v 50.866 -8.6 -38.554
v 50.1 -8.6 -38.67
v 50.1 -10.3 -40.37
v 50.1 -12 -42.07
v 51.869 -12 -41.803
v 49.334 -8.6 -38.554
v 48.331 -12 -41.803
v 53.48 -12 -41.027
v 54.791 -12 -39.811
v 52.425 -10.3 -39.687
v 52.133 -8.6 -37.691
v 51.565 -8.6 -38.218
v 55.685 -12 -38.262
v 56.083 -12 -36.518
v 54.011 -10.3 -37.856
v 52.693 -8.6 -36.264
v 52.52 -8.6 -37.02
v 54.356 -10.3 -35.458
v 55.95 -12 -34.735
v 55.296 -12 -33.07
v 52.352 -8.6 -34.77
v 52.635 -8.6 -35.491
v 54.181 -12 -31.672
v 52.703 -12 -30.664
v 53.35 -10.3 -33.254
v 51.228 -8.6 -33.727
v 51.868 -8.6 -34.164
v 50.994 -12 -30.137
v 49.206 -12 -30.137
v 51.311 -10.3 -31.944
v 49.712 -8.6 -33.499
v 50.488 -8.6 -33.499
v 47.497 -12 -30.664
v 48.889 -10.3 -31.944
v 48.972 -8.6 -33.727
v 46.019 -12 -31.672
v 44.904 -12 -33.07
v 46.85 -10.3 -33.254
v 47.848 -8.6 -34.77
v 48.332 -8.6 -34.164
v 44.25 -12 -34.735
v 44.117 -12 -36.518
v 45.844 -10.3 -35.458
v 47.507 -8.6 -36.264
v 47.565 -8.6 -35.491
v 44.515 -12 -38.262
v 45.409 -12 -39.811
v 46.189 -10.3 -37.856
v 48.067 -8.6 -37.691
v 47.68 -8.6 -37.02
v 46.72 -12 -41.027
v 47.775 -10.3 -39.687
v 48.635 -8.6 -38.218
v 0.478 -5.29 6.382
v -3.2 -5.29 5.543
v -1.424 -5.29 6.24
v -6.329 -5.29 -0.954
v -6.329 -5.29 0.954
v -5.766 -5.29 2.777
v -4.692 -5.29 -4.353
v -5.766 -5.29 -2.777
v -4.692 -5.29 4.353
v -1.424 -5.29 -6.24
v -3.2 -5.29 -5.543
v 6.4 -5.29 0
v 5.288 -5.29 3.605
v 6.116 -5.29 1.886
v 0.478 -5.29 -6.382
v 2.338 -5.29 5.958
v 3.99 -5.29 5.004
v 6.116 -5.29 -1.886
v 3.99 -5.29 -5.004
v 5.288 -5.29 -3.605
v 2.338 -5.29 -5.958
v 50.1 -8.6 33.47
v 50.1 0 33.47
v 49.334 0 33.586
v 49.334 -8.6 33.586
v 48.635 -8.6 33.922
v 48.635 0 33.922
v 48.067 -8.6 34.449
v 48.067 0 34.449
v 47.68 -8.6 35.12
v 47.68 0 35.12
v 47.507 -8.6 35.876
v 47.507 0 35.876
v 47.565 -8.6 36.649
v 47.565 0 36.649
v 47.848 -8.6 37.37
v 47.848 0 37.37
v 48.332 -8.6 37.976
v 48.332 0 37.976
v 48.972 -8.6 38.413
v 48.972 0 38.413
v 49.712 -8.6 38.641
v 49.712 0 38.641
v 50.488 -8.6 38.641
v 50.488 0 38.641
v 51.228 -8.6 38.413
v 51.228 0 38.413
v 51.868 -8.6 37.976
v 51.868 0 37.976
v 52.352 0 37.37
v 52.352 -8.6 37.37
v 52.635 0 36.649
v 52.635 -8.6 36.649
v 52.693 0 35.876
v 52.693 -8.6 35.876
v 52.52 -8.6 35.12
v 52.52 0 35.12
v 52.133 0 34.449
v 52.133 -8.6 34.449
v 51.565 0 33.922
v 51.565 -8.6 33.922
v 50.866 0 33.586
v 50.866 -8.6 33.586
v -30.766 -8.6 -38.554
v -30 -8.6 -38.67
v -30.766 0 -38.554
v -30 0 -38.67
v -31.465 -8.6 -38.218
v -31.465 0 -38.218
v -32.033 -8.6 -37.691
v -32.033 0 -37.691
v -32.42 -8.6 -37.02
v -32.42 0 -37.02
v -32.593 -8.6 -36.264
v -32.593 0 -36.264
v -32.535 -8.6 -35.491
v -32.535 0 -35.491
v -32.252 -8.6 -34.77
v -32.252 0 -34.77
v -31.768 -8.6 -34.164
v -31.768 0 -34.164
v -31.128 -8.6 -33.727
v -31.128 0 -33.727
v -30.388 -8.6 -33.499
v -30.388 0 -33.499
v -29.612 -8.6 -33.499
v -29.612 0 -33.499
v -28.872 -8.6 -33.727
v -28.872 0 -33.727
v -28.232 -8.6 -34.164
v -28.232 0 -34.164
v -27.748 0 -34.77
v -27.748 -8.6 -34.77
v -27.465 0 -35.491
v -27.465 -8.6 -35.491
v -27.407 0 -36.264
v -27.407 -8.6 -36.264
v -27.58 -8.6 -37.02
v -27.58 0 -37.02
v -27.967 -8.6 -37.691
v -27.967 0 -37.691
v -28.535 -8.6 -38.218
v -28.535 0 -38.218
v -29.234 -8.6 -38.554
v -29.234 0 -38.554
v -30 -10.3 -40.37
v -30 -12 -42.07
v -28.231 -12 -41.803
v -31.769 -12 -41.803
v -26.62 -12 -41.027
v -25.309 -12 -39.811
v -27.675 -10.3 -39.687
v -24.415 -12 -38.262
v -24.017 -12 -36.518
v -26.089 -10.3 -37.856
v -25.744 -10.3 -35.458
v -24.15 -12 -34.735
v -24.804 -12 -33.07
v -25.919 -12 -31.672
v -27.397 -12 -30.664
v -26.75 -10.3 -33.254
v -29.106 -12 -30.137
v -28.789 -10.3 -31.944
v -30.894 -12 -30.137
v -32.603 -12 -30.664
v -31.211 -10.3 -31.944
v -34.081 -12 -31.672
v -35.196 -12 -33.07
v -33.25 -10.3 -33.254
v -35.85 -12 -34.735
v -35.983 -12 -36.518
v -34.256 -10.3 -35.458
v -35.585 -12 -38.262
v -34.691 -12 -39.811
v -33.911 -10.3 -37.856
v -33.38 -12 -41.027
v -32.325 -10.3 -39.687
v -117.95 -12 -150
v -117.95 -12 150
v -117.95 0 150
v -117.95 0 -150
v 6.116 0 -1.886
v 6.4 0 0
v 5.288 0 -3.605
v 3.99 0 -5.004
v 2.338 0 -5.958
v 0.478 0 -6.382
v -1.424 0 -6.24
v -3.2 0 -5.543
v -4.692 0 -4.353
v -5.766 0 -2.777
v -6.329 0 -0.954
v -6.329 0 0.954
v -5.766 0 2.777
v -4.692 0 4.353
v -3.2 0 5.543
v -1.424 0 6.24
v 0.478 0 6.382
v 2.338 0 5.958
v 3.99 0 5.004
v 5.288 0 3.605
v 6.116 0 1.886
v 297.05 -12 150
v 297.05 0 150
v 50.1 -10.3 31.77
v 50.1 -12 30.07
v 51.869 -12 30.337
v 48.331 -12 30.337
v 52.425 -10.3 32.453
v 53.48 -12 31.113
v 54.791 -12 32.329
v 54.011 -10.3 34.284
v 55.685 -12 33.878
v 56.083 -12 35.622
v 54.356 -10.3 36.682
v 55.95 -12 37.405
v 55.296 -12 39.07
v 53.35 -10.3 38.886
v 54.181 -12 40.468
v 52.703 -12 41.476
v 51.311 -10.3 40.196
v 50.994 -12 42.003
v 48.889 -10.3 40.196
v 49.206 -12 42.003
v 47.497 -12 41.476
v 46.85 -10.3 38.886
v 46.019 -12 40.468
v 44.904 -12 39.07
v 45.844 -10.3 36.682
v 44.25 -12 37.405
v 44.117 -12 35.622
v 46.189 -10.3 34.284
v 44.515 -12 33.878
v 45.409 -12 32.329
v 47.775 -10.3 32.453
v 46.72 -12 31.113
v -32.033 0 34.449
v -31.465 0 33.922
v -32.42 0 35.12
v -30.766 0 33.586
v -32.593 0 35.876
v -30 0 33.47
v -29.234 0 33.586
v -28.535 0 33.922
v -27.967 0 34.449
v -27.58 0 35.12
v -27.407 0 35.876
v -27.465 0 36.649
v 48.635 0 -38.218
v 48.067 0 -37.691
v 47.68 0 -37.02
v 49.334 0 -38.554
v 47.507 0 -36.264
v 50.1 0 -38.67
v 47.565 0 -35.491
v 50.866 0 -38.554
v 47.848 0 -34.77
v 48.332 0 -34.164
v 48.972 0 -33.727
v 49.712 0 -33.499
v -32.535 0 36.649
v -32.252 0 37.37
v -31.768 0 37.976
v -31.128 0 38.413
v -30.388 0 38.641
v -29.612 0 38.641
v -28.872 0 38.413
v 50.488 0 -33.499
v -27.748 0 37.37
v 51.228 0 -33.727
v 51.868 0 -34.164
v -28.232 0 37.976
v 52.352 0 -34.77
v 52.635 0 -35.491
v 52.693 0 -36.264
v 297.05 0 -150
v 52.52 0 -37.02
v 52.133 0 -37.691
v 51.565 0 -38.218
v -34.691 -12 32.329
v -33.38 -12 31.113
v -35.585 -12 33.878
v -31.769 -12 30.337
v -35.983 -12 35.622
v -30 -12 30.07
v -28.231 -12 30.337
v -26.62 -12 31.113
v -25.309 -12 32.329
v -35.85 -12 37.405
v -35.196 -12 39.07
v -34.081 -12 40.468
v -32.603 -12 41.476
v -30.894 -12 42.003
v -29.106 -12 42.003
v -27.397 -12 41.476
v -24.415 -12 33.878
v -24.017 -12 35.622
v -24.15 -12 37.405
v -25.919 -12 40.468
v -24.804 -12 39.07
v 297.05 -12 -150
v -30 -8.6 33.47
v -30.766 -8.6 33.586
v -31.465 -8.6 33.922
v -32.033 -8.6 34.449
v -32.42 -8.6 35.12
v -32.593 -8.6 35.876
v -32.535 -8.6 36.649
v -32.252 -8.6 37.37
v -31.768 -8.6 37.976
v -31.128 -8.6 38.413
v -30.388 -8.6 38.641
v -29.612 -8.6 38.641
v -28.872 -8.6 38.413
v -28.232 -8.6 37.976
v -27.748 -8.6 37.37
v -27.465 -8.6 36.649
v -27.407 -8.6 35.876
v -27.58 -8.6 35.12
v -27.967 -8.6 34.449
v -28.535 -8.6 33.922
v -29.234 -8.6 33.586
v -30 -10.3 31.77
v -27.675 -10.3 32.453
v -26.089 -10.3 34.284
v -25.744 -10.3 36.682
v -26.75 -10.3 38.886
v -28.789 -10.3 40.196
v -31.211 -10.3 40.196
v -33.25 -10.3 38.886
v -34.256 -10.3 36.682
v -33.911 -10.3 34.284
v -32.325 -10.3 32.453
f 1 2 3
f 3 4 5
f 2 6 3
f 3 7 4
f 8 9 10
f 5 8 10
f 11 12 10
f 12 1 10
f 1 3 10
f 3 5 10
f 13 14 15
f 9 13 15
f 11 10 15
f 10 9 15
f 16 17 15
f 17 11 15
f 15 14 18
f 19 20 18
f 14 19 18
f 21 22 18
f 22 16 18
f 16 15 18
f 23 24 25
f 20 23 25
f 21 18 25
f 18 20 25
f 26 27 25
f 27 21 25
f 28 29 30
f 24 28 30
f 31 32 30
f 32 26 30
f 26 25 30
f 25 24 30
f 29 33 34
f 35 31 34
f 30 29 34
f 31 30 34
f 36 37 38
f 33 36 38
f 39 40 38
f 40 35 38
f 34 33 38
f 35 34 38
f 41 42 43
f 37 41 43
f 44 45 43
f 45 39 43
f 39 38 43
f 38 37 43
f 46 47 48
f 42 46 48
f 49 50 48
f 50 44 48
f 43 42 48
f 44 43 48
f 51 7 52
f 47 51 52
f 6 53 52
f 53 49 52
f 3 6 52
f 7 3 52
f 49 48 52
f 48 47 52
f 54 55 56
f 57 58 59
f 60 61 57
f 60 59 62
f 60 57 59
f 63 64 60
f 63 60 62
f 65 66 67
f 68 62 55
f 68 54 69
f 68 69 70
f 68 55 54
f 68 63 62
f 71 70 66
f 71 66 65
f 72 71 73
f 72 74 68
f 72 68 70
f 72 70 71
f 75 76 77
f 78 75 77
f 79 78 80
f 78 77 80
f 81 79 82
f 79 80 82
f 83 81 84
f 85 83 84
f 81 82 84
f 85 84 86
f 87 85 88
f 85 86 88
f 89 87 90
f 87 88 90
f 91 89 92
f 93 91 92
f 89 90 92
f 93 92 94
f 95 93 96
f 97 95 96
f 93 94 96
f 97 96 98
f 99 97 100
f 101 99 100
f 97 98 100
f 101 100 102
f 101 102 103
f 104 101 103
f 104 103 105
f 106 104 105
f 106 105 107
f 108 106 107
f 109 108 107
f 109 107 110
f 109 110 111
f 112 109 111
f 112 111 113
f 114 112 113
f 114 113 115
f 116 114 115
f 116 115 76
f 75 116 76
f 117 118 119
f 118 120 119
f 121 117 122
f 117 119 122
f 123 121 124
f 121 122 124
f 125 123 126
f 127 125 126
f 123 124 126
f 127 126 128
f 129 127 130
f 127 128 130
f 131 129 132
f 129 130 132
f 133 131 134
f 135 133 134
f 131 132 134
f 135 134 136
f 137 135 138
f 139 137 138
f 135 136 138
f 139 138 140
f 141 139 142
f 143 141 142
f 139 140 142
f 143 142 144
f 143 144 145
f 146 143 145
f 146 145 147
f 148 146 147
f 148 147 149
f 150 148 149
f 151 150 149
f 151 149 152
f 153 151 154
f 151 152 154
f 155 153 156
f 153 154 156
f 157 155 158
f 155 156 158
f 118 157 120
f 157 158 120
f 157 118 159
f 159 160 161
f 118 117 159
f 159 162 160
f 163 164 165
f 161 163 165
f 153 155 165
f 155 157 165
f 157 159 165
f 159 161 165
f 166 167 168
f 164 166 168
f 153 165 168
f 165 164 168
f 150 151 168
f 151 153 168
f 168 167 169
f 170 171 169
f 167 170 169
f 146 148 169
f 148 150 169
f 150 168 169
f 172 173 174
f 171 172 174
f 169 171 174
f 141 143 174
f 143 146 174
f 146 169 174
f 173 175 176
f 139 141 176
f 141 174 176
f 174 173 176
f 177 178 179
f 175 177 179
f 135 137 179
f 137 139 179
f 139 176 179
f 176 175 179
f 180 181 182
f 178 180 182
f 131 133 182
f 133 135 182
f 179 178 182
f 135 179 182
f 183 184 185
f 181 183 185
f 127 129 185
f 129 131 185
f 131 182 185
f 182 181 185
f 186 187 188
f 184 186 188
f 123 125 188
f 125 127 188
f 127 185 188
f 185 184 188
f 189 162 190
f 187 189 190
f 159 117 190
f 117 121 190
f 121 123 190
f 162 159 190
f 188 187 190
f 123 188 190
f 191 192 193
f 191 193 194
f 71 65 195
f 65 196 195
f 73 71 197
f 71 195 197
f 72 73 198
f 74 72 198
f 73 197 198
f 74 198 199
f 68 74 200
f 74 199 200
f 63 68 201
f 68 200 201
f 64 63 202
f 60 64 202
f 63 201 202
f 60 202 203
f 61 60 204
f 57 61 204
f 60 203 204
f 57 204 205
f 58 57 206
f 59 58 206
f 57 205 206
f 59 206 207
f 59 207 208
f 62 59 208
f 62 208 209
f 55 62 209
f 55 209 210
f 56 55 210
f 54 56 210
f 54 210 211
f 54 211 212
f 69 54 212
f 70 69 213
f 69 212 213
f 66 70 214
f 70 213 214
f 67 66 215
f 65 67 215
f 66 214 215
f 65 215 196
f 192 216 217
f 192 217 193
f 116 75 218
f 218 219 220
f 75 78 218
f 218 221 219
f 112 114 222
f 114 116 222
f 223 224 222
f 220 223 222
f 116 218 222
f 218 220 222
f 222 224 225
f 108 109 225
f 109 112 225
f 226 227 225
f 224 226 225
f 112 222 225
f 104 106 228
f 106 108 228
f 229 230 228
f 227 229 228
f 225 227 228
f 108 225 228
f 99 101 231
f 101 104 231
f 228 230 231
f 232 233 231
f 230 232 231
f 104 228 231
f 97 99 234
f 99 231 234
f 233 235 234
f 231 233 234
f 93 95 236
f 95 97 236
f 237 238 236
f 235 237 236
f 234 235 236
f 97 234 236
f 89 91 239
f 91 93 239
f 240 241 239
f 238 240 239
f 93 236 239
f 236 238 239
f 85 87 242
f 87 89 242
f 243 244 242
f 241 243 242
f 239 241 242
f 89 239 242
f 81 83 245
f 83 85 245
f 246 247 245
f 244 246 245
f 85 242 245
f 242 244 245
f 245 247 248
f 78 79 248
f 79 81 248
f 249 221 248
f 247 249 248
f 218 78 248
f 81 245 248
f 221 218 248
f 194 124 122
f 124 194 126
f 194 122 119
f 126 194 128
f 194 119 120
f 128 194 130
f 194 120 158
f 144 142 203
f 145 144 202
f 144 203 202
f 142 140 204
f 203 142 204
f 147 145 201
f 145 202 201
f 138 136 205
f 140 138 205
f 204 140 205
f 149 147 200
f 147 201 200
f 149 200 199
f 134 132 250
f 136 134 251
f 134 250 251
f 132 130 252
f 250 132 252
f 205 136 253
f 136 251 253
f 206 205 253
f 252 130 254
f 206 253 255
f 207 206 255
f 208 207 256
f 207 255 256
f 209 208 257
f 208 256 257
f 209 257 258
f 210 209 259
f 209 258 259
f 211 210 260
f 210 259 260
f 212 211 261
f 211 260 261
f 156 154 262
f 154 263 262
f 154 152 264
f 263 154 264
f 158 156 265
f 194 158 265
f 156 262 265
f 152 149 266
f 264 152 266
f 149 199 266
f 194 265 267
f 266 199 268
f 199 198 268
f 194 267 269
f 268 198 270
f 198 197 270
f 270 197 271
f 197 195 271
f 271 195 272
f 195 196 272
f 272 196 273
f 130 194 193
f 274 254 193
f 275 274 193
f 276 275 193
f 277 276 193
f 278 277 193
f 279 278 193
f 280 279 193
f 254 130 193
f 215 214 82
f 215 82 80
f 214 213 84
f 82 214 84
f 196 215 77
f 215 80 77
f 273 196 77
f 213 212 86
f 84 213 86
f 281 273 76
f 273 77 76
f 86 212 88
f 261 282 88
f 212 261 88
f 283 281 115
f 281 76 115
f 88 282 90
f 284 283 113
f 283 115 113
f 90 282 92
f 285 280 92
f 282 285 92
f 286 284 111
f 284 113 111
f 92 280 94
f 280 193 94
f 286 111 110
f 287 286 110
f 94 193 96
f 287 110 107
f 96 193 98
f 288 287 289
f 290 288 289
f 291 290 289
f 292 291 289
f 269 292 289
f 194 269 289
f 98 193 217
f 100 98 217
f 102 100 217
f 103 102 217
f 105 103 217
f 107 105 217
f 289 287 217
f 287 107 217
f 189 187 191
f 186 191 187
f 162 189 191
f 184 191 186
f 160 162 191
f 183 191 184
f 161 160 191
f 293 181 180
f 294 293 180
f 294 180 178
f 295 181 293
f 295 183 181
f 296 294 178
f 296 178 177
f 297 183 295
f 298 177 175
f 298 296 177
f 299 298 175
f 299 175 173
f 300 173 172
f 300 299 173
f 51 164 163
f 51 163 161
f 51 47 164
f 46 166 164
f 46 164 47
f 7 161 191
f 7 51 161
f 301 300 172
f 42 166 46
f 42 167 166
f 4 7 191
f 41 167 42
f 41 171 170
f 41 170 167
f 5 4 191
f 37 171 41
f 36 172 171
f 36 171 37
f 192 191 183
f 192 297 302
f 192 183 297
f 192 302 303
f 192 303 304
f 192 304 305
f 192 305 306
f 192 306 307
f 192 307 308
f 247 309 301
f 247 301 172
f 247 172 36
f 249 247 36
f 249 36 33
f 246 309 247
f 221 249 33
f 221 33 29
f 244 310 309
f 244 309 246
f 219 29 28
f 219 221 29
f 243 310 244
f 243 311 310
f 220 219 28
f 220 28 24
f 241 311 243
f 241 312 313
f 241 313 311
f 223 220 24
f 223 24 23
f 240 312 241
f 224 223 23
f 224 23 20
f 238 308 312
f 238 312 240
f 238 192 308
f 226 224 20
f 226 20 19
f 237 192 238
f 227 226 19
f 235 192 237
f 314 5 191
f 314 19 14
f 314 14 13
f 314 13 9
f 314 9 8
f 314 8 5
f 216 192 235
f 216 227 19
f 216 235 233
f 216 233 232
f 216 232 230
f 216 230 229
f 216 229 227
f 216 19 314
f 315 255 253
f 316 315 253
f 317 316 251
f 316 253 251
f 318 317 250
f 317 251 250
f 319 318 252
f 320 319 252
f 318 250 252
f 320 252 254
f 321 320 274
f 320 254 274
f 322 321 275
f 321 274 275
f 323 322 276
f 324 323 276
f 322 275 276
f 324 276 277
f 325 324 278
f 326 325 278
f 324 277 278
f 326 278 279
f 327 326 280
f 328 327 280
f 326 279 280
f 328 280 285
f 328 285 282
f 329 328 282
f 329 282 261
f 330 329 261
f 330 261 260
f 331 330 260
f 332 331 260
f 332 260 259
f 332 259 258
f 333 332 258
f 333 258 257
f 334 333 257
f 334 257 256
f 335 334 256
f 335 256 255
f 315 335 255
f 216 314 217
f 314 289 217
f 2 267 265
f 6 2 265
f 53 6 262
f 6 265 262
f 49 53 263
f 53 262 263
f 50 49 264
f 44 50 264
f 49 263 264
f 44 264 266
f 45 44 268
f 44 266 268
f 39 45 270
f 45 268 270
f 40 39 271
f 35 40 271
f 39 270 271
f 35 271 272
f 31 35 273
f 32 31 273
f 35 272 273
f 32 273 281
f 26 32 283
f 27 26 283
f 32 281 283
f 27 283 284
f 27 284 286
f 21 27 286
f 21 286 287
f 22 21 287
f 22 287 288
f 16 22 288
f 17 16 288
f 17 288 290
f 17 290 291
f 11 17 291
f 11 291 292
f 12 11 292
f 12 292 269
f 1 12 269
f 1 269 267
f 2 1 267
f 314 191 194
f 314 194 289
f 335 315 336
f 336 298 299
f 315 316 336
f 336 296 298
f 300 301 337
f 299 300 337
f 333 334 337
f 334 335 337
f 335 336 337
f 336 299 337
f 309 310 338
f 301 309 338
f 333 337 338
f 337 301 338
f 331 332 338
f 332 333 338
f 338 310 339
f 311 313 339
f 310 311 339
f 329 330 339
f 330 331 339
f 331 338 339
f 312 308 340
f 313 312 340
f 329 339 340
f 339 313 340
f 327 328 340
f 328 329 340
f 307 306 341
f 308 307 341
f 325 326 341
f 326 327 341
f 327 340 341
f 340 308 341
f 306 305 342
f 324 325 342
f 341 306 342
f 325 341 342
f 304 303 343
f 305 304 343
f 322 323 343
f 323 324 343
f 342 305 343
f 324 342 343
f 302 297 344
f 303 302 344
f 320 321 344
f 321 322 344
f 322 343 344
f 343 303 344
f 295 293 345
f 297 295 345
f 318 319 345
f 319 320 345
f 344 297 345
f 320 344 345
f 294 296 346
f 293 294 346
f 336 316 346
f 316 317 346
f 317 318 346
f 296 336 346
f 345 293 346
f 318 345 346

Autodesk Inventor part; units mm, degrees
ref_plane "YZ Plane" through (0, 0, 0) normal (1, 0, 0) x (0, 1, 0)
ref_plane "XZ Plane" through (0, 0, 0) normal (0, 1, 0) x (-1, 0, 0)
ref_plane "XY Plane" through (0, 0, 0) normal (0, 0, 1) x (1, 0, 0)
sketch "Sketch7" plane through (0, 0, 0) normal (0, 1, 0) x (-1, 0, 0)
  line L0 (52.95, -150) -> (-297.05, -150)
  line L1 (-297.05, -150) -> (-297.05, 150)
  line L2 (-297.05, 150) -> (52.95, 150)
  line L3 (52.95, 150) -> (52.95, -150)
  point P0 (0, 0)
  point P1 (52.95, 0)
  dimension "d32" = 350
  dimension "d33" = 300
  dimension "d34" = 52.95
extrude "Extrusion4" add sketch "Sketch7" against normal blind 12
sketch "Sketch8" plane through (0, -12, 0) normal (0, -1, 0) x (1, 0, 0)
  line L0 (54.25, -50.07) -> (54.25, 50.07) projected
  line L1 (45.95, -50.07) -> (45.95, 50.07) projected
  line L2 (-34.15, -50.07) -> (-34.15, 50.07) projected
  line L3 (-25.85, -50.07) -> (-25.85, 50.07) projected
  line L4 (-34.15, -50.07) -> (-25.85, -50.07)
  line L5 (-34.15, 50.07) -> (-25.85, 50.07)
  line L6 (45.95, 50.07) -> (54.25, 50.07)
  line L7 (45.95, -50.07) -> (54.25, -50.07)
  line L8 (-30, -50.07) -> (-30, 50.07)
  line L9 (50.1, -50.07) -> (50.1, 50.07)
  line L10 (-25.85, 0) -> (45.95, 0)
  point P0 (0, 0)
  point P1 (-30, -36.07)
  point P2 (50.1, -36.07)
  point P3 (-30, 36.07)
  point P4 (50.1, 36.07)
  dimension "d37" = 14
hole "Hole3" at (-30, -12, -36.07) at (50.1, -12, -36.07) at (-30, -12, 36.07) at (50.1, -12, 36.07) direction (0, 1, 0) diameter 5.2 end through all countersink diameter 12 countersink angle 90
sketch "Sketch9" plane through (0, -12, 0) normal (0, -1, 0) x (1, 0, 0)
  line L0 (-52.95, 150) -> (-52.95, -150) projected
  line L1 (-52.95, 150) -> (-117.95, 150)
  line L2 (-117.95, 150) -> (-117.95, -150)
  line L3 (-117.95, -150) -> (-52.95, -150)
  line L4 (-52.95, -150) -> (-52.95, 150)
  point P0 (0, 0)
  dimension "d45" = 65
extrude "Extrusion5" add sketch "Sketch9" against normal up to surface (12 mm away)
sketch "Sketch10" plane through (0, 0, 0) normal (0, 1, 0) x (1, 0, 0)
  circle A0 centre (0, 0) radius 6.4
  line L0 (-117.95, -150) -> (-117.95, 150) projected
  point P0 (0, 0)
  point P1 (-117.95, 0)
  dimension "d48" = 117.95
  dimension "d49" = 12.8
extrude "Extrusion6" cut sketch "Sketch10" against normal blind 5.29
equation "\"TransitionRadius\" = BendRadius"
equation "\"BendRadius\" = 0.5"
properties part number "base_plates" material "Wood (Birch)"
